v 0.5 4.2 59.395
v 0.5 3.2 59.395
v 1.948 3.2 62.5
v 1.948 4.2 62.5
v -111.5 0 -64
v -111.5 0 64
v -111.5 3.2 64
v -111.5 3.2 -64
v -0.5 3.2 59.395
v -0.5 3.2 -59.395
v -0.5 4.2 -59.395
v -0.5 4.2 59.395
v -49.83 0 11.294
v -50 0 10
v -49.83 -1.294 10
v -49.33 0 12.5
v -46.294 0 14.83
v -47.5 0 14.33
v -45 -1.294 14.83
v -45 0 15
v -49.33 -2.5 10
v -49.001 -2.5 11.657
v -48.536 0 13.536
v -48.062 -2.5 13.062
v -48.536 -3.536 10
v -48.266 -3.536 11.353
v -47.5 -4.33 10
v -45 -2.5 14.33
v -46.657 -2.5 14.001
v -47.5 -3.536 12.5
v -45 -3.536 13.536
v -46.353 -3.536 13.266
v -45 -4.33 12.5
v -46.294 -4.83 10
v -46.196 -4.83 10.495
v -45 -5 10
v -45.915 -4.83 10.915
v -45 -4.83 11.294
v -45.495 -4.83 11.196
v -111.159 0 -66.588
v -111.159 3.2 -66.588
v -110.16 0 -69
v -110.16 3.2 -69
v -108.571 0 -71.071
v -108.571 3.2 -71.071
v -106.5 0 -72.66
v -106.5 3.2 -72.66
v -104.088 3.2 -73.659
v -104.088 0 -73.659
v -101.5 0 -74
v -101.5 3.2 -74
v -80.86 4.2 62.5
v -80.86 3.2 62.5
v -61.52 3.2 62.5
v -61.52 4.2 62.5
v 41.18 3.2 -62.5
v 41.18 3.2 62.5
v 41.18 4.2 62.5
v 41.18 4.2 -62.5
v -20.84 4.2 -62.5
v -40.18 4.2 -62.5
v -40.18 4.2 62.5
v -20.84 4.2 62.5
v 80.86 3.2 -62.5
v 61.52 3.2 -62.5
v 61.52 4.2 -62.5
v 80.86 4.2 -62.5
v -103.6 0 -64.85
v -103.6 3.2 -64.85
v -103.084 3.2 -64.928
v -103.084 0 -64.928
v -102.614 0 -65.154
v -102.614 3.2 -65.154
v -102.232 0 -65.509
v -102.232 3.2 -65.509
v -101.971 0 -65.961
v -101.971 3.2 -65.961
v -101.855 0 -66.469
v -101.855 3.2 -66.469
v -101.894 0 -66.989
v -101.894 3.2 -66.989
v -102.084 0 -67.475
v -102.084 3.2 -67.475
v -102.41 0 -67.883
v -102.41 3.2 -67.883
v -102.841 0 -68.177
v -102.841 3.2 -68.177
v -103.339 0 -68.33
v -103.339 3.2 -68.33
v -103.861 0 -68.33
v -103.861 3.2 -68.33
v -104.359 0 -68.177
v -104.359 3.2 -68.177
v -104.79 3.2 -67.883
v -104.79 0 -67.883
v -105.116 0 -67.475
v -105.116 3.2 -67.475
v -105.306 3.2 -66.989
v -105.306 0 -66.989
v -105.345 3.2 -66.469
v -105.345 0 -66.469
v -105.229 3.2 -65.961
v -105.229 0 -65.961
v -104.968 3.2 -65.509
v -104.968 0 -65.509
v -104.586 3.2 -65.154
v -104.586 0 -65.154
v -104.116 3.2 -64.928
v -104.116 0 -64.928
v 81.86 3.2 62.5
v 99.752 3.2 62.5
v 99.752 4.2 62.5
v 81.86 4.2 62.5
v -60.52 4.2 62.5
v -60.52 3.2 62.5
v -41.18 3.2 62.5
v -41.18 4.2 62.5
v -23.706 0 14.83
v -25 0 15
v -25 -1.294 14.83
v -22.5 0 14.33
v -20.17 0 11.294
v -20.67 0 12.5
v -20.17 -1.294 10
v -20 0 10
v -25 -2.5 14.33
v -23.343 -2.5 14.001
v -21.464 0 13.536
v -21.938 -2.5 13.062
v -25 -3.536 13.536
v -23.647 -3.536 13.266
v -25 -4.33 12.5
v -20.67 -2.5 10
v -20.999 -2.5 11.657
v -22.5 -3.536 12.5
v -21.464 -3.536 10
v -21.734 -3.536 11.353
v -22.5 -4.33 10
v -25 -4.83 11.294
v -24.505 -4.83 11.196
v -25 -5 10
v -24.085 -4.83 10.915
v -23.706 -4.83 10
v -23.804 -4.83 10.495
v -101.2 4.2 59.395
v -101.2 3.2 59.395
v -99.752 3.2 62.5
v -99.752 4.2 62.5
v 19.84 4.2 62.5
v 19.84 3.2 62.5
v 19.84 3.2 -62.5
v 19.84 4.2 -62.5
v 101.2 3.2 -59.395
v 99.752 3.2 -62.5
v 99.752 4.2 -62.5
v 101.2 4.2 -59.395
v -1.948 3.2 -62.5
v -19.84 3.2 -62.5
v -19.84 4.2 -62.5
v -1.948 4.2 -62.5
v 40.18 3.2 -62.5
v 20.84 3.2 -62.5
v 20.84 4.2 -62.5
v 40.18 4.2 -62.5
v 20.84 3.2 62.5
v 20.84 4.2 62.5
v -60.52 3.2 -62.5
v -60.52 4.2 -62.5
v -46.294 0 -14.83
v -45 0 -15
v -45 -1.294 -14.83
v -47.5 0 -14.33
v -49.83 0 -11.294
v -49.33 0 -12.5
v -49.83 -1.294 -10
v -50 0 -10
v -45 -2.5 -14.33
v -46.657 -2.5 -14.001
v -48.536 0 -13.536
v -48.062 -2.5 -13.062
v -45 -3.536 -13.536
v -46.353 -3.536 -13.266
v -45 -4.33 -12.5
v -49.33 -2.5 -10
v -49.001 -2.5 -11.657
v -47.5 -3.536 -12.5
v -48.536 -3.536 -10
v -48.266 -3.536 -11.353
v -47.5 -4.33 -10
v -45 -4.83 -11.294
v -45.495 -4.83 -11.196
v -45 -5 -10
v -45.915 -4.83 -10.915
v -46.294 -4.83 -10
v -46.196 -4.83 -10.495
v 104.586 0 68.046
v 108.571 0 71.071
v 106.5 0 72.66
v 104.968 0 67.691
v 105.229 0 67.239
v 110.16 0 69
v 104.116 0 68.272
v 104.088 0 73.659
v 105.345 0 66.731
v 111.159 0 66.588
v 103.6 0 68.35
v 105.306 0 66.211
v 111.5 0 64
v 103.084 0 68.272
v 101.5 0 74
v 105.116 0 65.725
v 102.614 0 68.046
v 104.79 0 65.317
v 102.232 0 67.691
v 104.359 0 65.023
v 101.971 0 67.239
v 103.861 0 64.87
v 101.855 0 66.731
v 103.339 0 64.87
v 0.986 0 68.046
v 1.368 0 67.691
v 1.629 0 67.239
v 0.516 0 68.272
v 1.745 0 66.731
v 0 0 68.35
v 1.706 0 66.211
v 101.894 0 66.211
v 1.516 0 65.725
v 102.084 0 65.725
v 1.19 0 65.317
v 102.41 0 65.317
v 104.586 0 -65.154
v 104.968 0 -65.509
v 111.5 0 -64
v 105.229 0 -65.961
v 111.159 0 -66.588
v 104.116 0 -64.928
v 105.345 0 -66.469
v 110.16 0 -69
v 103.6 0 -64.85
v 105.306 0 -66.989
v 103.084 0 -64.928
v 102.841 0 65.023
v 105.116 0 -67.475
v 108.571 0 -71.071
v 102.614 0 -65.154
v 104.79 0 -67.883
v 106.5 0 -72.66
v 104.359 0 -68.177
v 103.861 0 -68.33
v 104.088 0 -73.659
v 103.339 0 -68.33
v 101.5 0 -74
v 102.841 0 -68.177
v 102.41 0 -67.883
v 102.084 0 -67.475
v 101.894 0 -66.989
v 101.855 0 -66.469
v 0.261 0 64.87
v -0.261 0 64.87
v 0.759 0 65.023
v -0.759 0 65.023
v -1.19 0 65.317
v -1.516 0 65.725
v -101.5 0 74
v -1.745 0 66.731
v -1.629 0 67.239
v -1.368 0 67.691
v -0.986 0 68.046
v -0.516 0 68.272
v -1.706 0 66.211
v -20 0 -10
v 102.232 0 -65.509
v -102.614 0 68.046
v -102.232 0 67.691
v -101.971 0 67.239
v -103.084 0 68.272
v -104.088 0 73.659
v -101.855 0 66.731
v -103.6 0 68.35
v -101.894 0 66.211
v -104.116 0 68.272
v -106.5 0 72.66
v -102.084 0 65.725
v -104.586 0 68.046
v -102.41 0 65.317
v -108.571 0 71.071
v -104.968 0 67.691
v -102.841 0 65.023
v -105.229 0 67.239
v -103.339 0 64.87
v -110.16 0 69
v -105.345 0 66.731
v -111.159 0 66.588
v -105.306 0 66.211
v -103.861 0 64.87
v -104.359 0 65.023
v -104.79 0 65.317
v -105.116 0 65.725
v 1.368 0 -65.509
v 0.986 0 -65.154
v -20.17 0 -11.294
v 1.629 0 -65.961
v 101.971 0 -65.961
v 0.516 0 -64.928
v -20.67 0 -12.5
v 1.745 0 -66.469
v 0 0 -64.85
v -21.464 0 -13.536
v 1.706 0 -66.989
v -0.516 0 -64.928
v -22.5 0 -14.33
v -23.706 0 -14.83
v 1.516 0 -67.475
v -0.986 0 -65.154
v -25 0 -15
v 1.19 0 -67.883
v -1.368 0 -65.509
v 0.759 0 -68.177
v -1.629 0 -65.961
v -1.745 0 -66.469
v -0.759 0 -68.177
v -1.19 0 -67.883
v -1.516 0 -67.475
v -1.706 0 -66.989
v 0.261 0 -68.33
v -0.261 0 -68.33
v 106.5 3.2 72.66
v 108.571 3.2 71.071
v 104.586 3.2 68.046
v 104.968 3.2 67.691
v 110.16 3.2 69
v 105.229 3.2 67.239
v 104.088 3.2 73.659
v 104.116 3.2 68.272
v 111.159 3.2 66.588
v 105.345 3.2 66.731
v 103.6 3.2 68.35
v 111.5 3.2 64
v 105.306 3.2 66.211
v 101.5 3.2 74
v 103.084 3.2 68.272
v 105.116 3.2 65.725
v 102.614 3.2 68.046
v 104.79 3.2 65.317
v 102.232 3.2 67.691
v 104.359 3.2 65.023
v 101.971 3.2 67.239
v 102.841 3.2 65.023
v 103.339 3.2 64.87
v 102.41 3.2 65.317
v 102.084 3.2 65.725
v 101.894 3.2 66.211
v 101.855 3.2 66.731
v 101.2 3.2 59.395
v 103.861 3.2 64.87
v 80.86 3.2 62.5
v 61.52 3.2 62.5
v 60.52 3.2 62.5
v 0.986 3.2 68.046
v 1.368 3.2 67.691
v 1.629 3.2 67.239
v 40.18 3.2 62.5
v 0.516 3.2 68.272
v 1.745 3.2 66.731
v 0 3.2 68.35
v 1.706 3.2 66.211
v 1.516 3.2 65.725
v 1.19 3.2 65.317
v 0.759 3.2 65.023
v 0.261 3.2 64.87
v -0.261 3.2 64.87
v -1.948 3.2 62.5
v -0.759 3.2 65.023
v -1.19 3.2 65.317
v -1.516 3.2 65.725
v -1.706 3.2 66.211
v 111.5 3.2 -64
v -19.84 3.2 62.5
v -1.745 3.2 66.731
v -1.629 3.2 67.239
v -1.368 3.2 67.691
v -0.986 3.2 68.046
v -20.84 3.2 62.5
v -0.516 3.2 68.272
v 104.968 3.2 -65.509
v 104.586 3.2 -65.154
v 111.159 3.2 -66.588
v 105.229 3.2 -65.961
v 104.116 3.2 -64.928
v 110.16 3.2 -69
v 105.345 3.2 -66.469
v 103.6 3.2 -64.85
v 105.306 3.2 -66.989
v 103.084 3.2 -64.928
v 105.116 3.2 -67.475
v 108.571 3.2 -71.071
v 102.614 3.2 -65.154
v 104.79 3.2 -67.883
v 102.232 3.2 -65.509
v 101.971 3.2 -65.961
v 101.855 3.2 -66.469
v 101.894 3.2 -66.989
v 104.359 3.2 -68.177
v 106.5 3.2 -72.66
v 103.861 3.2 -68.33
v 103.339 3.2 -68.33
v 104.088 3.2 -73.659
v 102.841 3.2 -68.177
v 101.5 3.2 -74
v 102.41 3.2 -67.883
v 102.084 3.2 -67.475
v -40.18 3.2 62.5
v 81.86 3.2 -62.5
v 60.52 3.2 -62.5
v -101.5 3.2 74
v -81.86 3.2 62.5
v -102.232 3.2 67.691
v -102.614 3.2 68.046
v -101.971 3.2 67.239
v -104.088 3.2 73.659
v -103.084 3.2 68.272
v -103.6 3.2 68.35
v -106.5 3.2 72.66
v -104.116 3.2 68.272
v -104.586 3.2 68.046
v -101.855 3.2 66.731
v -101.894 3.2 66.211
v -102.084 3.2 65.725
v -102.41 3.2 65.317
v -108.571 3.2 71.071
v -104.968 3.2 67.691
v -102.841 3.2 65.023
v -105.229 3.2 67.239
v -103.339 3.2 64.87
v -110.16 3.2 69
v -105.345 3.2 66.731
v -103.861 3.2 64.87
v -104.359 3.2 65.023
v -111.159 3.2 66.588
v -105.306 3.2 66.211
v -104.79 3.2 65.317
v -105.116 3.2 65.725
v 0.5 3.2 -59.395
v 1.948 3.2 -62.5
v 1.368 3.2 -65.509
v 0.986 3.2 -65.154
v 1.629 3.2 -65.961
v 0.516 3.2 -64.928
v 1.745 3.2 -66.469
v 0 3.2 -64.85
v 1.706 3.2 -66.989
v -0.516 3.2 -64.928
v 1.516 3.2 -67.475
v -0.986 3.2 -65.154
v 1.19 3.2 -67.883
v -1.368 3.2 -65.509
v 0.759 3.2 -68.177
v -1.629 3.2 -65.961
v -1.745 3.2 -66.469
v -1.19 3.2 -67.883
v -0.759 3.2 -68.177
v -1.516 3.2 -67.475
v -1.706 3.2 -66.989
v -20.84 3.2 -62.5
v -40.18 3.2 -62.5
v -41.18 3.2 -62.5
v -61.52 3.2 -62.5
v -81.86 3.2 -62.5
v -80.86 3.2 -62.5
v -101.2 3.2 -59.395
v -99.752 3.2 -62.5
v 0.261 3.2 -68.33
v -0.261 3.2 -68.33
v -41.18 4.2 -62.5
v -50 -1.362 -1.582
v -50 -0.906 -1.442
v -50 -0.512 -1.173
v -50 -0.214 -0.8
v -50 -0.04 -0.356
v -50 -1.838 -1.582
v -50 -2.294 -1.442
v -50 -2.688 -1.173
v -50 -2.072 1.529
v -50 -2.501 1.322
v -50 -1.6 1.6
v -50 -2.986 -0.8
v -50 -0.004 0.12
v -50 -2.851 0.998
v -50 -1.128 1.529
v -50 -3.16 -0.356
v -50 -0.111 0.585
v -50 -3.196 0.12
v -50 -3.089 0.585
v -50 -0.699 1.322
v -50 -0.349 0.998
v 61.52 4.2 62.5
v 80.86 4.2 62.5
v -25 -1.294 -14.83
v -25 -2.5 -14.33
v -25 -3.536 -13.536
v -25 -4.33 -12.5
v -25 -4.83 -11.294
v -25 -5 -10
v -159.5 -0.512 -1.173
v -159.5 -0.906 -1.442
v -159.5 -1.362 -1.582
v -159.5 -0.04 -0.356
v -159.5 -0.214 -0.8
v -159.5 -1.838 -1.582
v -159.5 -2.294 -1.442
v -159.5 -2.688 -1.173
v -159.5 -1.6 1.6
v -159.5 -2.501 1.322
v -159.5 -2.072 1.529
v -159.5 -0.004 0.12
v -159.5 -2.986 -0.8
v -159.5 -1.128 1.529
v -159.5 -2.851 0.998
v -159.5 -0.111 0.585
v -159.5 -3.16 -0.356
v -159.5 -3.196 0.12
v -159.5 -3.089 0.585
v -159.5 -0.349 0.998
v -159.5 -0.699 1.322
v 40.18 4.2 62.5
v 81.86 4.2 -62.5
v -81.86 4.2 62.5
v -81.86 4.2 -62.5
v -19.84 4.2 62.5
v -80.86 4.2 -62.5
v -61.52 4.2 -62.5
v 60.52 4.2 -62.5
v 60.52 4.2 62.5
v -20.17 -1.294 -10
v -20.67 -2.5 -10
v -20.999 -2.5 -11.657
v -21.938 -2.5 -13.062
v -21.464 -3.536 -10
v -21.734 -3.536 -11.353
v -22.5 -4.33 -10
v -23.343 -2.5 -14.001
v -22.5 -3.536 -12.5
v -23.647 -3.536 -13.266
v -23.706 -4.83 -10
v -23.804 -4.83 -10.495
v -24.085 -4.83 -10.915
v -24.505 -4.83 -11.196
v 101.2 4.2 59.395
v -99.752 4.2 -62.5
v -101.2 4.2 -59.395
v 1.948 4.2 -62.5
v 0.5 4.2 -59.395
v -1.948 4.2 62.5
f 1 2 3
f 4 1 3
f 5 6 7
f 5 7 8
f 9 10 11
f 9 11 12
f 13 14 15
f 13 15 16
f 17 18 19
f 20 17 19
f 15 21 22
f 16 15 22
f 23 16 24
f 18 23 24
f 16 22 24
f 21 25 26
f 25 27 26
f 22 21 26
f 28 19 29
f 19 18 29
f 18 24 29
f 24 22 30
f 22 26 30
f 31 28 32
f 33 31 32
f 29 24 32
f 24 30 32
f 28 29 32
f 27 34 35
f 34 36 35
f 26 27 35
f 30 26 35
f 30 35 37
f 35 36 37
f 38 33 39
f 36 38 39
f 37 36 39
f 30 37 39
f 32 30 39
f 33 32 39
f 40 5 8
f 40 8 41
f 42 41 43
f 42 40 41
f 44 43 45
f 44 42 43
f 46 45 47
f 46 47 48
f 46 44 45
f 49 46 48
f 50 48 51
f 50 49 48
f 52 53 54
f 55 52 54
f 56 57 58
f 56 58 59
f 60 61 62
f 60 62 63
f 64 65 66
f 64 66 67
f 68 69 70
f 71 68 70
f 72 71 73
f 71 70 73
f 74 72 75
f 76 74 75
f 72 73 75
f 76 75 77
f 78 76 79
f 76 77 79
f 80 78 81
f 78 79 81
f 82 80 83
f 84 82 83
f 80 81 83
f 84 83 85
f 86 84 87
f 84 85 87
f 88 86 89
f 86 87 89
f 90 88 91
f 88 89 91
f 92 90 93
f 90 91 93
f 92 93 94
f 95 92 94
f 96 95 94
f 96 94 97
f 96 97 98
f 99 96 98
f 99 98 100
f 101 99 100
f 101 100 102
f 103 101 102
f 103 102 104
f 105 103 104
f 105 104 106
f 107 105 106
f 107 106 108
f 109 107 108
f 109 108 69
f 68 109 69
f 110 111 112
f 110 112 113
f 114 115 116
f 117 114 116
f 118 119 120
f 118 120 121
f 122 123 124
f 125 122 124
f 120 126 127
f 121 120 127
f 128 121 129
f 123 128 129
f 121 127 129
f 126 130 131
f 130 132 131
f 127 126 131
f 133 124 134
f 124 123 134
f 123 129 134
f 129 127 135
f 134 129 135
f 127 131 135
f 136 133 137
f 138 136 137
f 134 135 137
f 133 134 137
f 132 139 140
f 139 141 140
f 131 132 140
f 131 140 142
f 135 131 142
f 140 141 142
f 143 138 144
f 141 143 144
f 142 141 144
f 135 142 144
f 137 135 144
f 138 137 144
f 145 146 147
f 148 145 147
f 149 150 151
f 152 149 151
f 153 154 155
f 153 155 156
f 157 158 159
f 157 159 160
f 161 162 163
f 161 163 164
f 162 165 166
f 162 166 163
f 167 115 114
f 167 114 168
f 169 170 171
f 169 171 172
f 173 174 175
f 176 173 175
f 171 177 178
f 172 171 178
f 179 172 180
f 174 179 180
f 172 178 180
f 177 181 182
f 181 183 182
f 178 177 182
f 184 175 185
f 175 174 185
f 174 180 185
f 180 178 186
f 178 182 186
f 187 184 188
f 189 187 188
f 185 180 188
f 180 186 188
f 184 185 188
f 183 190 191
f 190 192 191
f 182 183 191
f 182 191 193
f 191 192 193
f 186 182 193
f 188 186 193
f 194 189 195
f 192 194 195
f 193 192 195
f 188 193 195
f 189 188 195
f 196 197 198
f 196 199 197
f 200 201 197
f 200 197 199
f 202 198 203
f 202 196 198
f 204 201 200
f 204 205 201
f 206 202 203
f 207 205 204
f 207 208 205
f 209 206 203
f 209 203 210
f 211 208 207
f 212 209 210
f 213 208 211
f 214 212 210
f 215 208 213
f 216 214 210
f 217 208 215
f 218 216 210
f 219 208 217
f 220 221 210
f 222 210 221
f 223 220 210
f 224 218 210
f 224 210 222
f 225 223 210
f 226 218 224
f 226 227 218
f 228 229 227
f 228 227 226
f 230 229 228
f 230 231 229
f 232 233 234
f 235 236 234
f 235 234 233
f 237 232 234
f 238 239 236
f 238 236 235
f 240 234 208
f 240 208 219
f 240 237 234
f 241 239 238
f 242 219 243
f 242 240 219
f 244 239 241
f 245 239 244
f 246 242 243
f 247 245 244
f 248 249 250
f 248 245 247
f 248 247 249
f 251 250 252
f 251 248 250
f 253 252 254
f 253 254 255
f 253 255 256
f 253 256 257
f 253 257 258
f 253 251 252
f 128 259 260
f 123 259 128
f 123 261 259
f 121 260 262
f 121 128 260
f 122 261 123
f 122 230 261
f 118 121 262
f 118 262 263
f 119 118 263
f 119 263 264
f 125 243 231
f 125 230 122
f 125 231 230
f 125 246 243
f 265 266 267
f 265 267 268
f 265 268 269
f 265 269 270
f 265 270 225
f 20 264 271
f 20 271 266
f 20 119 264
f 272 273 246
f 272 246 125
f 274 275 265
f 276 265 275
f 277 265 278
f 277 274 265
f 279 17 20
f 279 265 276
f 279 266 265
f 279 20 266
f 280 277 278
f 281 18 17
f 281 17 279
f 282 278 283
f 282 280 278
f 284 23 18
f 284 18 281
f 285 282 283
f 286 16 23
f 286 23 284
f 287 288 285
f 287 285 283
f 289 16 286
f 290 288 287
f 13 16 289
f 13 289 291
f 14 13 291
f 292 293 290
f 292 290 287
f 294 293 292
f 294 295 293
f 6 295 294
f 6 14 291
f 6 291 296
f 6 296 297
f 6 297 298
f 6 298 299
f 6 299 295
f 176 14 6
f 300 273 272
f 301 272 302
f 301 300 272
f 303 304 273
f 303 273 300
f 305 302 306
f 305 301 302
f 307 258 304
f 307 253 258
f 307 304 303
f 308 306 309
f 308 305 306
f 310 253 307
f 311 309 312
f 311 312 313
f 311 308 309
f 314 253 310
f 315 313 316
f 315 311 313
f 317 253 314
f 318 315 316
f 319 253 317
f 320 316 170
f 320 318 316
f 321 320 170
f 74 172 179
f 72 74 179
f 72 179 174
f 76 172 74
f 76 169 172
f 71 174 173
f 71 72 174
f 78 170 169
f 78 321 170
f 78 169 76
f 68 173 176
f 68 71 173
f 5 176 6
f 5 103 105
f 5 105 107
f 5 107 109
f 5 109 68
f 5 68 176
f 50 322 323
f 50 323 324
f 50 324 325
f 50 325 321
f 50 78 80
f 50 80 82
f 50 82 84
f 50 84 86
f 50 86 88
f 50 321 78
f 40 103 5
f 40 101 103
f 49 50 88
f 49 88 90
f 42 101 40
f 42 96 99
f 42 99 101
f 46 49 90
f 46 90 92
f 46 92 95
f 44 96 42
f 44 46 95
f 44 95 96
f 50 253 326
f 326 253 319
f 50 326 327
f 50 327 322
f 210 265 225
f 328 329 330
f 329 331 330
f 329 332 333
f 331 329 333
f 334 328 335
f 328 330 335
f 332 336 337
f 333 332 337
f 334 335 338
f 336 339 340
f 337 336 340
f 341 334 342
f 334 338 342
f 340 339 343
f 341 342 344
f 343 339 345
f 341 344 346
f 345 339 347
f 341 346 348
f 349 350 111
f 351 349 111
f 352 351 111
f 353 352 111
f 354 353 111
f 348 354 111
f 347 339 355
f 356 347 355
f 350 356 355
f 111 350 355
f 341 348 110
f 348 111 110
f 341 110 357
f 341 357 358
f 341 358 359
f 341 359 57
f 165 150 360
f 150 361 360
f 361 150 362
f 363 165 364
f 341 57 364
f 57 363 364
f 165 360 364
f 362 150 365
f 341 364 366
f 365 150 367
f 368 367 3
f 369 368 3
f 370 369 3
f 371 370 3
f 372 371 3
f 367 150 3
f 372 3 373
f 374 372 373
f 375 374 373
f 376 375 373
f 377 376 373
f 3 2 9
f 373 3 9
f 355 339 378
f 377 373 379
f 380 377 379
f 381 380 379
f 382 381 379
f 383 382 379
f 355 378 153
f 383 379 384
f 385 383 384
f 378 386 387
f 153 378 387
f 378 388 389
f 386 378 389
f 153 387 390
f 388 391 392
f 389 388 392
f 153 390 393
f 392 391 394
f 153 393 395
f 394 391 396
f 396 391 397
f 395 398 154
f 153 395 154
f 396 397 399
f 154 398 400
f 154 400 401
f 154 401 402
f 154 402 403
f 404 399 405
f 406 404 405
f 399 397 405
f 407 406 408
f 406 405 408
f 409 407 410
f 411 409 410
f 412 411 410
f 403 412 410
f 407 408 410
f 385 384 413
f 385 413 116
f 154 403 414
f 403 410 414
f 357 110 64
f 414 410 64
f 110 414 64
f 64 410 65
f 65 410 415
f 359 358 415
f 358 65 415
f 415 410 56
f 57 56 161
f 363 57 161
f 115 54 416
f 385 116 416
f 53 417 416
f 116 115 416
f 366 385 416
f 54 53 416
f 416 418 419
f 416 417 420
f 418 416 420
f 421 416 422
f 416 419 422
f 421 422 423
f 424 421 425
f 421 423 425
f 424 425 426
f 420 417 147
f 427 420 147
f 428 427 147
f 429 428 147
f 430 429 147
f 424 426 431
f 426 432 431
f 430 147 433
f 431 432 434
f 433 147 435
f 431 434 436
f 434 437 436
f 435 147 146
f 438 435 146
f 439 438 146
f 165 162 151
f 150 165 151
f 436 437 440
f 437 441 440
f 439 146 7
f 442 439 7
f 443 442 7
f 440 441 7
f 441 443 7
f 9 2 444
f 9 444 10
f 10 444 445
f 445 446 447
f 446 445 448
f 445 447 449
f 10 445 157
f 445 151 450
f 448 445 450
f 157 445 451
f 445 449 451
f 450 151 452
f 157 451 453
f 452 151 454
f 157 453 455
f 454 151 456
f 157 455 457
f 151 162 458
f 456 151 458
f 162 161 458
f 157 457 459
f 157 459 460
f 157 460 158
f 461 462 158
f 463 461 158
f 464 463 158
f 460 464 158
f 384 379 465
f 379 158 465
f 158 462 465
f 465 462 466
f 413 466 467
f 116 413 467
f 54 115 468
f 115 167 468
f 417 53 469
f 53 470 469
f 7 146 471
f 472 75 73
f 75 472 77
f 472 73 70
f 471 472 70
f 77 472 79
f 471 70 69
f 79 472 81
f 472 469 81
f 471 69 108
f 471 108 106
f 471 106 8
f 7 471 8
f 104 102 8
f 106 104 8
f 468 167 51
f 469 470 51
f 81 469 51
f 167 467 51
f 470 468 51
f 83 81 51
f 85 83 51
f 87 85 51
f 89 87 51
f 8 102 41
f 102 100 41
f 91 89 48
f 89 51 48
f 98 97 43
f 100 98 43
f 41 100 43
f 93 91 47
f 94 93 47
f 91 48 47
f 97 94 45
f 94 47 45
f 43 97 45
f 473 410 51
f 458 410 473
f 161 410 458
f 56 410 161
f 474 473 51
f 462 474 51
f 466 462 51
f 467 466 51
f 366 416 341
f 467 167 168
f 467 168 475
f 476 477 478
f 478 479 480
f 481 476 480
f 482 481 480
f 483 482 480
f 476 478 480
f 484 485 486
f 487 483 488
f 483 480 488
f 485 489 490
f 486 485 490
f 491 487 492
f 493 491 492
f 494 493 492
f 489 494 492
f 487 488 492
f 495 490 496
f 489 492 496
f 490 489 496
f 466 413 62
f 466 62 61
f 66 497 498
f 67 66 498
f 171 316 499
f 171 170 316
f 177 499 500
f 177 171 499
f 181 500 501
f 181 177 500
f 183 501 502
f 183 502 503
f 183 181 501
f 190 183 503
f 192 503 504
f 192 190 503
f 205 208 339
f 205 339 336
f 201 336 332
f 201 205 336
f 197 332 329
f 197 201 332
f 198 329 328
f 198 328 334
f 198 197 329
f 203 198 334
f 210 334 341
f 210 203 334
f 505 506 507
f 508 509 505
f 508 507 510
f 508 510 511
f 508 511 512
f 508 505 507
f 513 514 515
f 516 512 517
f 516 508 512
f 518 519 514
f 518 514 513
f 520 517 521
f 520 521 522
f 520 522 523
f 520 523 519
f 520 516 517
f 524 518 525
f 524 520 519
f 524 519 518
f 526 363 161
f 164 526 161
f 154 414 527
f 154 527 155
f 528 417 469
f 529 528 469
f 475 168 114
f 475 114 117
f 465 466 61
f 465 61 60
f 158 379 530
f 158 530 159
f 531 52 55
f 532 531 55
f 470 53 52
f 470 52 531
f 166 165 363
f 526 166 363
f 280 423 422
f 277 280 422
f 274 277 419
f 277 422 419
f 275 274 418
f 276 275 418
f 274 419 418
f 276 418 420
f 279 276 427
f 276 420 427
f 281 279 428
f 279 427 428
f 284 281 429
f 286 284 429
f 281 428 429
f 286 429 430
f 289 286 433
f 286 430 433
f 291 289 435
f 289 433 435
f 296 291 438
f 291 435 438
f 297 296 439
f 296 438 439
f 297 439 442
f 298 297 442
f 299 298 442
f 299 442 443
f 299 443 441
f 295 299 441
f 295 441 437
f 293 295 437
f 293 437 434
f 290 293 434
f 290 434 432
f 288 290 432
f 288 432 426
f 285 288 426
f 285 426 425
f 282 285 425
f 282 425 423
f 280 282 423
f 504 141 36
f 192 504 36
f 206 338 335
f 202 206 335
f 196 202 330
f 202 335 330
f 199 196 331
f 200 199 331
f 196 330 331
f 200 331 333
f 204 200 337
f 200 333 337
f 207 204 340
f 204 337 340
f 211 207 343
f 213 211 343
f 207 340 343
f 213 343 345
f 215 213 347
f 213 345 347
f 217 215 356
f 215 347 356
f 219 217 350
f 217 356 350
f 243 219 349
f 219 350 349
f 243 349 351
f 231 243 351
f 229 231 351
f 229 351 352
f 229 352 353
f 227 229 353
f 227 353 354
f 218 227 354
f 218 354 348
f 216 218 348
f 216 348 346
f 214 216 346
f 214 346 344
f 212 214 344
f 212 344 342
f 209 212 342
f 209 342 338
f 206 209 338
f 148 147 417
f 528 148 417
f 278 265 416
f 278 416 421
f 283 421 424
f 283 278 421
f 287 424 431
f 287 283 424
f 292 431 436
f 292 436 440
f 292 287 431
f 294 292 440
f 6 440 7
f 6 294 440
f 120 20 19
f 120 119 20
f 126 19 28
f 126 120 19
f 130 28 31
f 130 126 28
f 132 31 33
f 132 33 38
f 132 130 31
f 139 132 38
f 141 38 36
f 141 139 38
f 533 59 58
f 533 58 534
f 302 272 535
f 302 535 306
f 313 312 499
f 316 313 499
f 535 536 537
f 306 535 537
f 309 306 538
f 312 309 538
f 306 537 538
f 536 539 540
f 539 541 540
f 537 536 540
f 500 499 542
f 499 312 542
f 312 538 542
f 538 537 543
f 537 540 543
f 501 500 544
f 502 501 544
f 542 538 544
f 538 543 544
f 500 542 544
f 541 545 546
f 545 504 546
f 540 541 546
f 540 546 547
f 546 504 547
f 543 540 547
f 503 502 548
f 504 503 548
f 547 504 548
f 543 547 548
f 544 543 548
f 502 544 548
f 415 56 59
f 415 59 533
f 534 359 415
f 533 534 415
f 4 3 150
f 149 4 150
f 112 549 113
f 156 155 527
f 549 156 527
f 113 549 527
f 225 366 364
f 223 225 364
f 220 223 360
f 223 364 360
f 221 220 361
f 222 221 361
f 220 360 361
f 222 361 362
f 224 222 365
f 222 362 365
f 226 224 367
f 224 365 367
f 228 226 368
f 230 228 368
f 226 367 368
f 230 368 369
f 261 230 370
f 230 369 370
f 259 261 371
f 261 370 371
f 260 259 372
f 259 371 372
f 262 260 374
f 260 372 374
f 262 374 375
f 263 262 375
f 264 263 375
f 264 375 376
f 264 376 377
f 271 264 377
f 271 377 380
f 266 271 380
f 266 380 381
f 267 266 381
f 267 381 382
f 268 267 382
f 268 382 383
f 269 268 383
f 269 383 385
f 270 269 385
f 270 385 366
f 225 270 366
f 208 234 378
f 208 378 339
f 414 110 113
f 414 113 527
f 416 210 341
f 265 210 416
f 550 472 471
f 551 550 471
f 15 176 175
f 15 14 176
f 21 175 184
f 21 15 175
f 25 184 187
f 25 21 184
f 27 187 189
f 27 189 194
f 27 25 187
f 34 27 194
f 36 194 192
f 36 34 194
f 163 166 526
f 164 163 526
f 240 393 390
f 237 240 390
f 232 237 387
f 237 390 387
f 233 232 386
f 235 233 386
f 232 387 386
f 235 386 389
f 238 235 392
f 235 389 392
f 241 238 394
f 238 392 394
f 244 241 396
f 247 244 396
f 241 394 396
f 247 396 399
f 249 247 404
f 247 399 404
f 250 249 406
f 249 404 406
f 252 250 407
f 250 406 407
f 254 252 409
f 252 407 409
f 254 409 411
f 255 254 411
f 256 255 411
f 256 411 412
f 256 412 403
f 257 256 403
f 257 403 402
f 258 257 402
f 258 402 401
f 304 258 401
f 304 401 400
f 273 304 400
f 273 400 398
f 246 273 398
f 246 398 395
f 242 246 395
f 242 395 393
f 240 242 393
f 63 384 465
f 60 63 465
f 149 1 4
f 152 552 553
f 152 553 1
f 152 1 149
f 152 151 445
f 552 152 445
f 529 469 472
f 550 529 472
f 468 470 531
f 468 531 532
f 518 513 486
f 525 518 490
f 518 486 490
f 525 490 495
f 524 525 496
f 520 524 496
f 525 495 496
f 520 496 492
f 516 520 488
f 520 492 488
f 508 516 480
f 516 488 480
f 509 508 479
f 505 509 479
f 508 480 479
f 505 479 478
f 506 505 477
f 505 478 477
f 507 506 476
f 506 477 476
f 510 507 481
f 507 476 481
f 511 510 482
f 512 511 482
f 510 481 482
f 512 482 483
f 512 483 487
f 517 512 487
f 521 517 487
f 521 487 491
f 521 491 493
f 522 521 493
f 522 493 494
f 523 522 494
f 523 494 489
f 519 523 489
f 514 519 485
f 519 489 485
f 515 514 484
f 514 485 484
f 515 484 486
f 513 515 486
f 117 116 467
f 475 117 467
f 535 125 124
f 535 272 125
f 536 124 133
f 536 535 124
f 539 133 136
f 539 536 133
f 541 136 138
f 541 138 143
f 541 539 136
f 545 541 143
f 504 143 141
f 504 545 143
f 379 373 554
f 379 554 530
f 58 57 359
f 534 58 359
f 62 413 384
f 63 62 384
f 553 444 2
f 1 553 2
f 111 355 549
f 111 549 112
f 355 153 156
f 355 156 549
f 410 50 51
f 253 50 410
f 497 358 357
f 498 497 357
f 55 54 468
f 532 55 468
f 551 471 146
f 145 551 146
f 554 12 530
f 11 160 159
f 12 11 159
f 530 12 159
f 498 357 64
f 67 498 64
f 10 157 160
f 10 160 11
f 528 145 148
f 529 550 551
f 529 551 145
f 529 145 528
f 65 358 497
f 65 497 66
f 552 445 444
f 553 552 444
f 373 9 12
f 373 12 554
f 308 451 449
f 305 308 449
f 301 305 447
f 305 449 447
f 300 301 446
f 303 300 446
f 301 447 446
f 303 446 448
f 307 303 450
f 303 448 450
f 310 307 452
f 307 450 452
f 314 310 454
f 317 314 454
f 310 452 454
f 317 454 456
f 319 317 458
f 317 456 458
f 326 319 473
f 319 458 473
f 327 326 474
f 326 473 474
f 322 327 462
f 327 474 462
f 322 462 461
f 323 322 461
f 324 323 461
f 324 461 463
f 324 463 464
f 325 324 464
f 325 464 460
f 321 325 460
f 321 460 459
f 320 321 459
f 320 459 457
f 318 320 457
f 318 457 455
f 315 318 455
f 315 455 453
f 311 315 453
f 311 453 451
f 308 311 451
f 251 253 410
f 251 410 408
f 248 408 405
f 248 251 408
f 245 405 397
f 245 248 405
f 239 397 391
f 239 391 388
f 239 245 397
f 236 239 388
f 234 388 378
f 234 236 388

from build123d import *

# Parameters (mm, degrees)
BOSS_EXTRUDE1_DEPTH      = 3.2
BOSS_EXTRUDE2_DEPTH      = 5
FILLET1_R                = 5
BOSS_EXTRUDE5_DEPTH      = 48
BOSS_EXTRUDE5_DEPTH_BACK = 61.5
SKETCH3_R                = 1.6
SKETCH4_R                = 1.75
CUT_EXTRUDE2_DEPTH       = 177.021277123
SKETCH5_W                = 19.34
SKETCH5_H                = 125
BOSS_EXTRUDE6_DEPTH      = 1


with BuildPart() as part:
    # Sketch1 → Boss-Extrude1 (new body)
    with BuildSketch(Plane(origin=(0, 0, 0), x_dir=(1, 0, 0), z_dir=(0, 1, 0))):
        with BuildLine():
            Line((-101.5, 74), (101.5, 74))
            ThreePointArc((101.5, 74), (108.571067812, 71.071067812), (111.5, 64))
            Line((111.5, 64), (111.5, -64))
            ThreePointArc((111.5, -64), (108.571067812, -71.071067812), (101.5, -74))
            Line((101.5, -74), (-101.5, -74))
            ThreePointArc((-101.5, -74), (-108.571067812, -71.071067812), (-111.5, -64))
            Line((-111.5, -64), (-111.5, 64))
            ThreePointArc((-111.5, 64), (-108.571067812, 71.071067812), (-101.5, 74))
        make_face()
    extrude(amount=BOSS_EXTRUDE1_DEPTH)

    # Sketch2 → Boss-Extrude2 (add)
    with BuildSketch(Plane.XZ):
        with BuildLine():
            Line((-45, 15), (-25, 15))
            ThreePointArc((-25, 15), (-21.464466094, 13.535533906), (-20, 10))
            Line((-20, 10), (-20, -10))
            ThreePointArc((-20, -10), (-21.464466094, -13.535533906), (-25, -15))
            Line((-25, -15), (-45, -15))
            ThreePointArc((-45, -15), (-48.535533906, -13.535533906), (-50, -10))
            Line((-50, -10), (-50, 10))
            ThreePointArc((-50, 10), (-48.535533906, 13.535533906), (-45, 15))
        make_face()
    extrude(amount=BOSS_EXTRUDE2_DEPTH)

    # Fillet1
    fillet1_edges = [part.edges().sort_by_distance(p)[0] for p in [
        (-20, -5, 0),
        (-21.464466094, -5, -13.535533906),
        (-35, -5, -15),
        (-48.535533906, -5, -13.535533906),
        (-50, -5, 0),
        (-48.535533906, -5, 13.535533906),
        (-35, -5, 15),
        (-21.464466094, -5, 13.535533906),
    ]]
    fillet(fillet1_edges, radius=FILLET1_R - 0.0001)  # a hair under: the kernel refuses the full size

    # Sketch4 → Cut-Extrude2 (cut, through all)
    with BuildSketch(Plane(origin=(0, 3.2, 0), x_dir=(1, 0, 0), z_dir=(0, 1, 0))):
        with Locations(Location((-103.6, 66.6, 0), (0, 0, 270))):
            Circle(SKETCH4_R)
        with Locations(Location((0, 66.6, 0), (0, 0, 270))):
            Circle(SKETCH4_R)
        with Locations(Location((103.6, 66.6, 0), (0, 0, 270))):
            Circle(SKETCH4_R)
        with Locations(Location((0, -66.6, 0), (0, 0, 270))):
            Circle(SKETCH4_R)
        with Locations(Location((103.6, -66.6, 0), (0, 0, 270))):
            Circle(SKETCH4_R)
        with Locations(Location((-103.6, -66.6, 0), (0, 0, 270))):
            Circle(SKETCH4_R)
    extrude(amount=-CUT_EXTRUDE2_DEPTH, mode=Mode.SUBTRACT)

    # Sketch5 → Boss-Extrude6 (add)
    with BuildSketch(Plane(origin=(0, 3.2, 0), x_dir=(1, 0, 0), z_dir=(0, 1, 0))):
        with Locations((-50.85, 0)):
            Rectangle(SKETCH5_W, SKETCH5_H)
        Polygon((-99.752228661, 62.5), (-101.2, 59.395244345), (-101.2, -59.395244345), (-99.752228661, -62.5), (-81.86, -62.5), (-81.86, 62.5), align=None)
        with Locations((-71.19, 0)):
            Rectangle(SKETCH5_W, SKETCH5_H)
        with Locations((-30.51, 0)):
            Rectangle(SKETCH5_W, SKETCH5_H)
        Polygon((-1.947771339, -62.5), (-19.84, -62.5), (-19.84, 62.5), (-1.947771339, 62.5), (-0.5, 59.395244345), (-0.5, -59.395244345), align=None)
        with Locations((50.85, 0)):
            Rectangle(SKETCH5_W, SKETCH5_H)
        Polygon((1.947771339, 62.5), (0.5, 59.395244345), (0.5, -59.395244345), (1.947771339, -62.5), (19.84, -62.5), (19.84, 62.5), align=None)
        with Locations((30.51, 0)):
            Rectangle(SKETCH5_W, SKETCH5_H)
        with Locations((71.19, 0)):
            Rectangle(SKETCH5_W, SKETCH5_H)
        Polygon((99.752228661, -62.5), (81.86, -62.5), (81.86, 62.5), (99.752228661, 62.5), (101.2, 59.395244345), (101.2, -59.395244345), align=None)
    extrude(amount=BOSS_EXTRUDE6_DEPTH)


with BuildPart() as body_2:
    # Sketch3 → Boss-Extrude5 (new, two sides: drawn at the far end of the back side and taken through both)
    with BuildSketch(Plane.ZY.offset(111.5).offset(-BOSS_EXTRUDE5_DEPTH_BACK)):
        with Locations((0, -1.6)):
            Circle(SKETCH3_R)
    extrude(amount=BOSS_EXTRUDE5_DEPTH + BOSS_EXTRUDE5_DEPTH_BACK)


solid = Compound([part.part, body_2.part])
